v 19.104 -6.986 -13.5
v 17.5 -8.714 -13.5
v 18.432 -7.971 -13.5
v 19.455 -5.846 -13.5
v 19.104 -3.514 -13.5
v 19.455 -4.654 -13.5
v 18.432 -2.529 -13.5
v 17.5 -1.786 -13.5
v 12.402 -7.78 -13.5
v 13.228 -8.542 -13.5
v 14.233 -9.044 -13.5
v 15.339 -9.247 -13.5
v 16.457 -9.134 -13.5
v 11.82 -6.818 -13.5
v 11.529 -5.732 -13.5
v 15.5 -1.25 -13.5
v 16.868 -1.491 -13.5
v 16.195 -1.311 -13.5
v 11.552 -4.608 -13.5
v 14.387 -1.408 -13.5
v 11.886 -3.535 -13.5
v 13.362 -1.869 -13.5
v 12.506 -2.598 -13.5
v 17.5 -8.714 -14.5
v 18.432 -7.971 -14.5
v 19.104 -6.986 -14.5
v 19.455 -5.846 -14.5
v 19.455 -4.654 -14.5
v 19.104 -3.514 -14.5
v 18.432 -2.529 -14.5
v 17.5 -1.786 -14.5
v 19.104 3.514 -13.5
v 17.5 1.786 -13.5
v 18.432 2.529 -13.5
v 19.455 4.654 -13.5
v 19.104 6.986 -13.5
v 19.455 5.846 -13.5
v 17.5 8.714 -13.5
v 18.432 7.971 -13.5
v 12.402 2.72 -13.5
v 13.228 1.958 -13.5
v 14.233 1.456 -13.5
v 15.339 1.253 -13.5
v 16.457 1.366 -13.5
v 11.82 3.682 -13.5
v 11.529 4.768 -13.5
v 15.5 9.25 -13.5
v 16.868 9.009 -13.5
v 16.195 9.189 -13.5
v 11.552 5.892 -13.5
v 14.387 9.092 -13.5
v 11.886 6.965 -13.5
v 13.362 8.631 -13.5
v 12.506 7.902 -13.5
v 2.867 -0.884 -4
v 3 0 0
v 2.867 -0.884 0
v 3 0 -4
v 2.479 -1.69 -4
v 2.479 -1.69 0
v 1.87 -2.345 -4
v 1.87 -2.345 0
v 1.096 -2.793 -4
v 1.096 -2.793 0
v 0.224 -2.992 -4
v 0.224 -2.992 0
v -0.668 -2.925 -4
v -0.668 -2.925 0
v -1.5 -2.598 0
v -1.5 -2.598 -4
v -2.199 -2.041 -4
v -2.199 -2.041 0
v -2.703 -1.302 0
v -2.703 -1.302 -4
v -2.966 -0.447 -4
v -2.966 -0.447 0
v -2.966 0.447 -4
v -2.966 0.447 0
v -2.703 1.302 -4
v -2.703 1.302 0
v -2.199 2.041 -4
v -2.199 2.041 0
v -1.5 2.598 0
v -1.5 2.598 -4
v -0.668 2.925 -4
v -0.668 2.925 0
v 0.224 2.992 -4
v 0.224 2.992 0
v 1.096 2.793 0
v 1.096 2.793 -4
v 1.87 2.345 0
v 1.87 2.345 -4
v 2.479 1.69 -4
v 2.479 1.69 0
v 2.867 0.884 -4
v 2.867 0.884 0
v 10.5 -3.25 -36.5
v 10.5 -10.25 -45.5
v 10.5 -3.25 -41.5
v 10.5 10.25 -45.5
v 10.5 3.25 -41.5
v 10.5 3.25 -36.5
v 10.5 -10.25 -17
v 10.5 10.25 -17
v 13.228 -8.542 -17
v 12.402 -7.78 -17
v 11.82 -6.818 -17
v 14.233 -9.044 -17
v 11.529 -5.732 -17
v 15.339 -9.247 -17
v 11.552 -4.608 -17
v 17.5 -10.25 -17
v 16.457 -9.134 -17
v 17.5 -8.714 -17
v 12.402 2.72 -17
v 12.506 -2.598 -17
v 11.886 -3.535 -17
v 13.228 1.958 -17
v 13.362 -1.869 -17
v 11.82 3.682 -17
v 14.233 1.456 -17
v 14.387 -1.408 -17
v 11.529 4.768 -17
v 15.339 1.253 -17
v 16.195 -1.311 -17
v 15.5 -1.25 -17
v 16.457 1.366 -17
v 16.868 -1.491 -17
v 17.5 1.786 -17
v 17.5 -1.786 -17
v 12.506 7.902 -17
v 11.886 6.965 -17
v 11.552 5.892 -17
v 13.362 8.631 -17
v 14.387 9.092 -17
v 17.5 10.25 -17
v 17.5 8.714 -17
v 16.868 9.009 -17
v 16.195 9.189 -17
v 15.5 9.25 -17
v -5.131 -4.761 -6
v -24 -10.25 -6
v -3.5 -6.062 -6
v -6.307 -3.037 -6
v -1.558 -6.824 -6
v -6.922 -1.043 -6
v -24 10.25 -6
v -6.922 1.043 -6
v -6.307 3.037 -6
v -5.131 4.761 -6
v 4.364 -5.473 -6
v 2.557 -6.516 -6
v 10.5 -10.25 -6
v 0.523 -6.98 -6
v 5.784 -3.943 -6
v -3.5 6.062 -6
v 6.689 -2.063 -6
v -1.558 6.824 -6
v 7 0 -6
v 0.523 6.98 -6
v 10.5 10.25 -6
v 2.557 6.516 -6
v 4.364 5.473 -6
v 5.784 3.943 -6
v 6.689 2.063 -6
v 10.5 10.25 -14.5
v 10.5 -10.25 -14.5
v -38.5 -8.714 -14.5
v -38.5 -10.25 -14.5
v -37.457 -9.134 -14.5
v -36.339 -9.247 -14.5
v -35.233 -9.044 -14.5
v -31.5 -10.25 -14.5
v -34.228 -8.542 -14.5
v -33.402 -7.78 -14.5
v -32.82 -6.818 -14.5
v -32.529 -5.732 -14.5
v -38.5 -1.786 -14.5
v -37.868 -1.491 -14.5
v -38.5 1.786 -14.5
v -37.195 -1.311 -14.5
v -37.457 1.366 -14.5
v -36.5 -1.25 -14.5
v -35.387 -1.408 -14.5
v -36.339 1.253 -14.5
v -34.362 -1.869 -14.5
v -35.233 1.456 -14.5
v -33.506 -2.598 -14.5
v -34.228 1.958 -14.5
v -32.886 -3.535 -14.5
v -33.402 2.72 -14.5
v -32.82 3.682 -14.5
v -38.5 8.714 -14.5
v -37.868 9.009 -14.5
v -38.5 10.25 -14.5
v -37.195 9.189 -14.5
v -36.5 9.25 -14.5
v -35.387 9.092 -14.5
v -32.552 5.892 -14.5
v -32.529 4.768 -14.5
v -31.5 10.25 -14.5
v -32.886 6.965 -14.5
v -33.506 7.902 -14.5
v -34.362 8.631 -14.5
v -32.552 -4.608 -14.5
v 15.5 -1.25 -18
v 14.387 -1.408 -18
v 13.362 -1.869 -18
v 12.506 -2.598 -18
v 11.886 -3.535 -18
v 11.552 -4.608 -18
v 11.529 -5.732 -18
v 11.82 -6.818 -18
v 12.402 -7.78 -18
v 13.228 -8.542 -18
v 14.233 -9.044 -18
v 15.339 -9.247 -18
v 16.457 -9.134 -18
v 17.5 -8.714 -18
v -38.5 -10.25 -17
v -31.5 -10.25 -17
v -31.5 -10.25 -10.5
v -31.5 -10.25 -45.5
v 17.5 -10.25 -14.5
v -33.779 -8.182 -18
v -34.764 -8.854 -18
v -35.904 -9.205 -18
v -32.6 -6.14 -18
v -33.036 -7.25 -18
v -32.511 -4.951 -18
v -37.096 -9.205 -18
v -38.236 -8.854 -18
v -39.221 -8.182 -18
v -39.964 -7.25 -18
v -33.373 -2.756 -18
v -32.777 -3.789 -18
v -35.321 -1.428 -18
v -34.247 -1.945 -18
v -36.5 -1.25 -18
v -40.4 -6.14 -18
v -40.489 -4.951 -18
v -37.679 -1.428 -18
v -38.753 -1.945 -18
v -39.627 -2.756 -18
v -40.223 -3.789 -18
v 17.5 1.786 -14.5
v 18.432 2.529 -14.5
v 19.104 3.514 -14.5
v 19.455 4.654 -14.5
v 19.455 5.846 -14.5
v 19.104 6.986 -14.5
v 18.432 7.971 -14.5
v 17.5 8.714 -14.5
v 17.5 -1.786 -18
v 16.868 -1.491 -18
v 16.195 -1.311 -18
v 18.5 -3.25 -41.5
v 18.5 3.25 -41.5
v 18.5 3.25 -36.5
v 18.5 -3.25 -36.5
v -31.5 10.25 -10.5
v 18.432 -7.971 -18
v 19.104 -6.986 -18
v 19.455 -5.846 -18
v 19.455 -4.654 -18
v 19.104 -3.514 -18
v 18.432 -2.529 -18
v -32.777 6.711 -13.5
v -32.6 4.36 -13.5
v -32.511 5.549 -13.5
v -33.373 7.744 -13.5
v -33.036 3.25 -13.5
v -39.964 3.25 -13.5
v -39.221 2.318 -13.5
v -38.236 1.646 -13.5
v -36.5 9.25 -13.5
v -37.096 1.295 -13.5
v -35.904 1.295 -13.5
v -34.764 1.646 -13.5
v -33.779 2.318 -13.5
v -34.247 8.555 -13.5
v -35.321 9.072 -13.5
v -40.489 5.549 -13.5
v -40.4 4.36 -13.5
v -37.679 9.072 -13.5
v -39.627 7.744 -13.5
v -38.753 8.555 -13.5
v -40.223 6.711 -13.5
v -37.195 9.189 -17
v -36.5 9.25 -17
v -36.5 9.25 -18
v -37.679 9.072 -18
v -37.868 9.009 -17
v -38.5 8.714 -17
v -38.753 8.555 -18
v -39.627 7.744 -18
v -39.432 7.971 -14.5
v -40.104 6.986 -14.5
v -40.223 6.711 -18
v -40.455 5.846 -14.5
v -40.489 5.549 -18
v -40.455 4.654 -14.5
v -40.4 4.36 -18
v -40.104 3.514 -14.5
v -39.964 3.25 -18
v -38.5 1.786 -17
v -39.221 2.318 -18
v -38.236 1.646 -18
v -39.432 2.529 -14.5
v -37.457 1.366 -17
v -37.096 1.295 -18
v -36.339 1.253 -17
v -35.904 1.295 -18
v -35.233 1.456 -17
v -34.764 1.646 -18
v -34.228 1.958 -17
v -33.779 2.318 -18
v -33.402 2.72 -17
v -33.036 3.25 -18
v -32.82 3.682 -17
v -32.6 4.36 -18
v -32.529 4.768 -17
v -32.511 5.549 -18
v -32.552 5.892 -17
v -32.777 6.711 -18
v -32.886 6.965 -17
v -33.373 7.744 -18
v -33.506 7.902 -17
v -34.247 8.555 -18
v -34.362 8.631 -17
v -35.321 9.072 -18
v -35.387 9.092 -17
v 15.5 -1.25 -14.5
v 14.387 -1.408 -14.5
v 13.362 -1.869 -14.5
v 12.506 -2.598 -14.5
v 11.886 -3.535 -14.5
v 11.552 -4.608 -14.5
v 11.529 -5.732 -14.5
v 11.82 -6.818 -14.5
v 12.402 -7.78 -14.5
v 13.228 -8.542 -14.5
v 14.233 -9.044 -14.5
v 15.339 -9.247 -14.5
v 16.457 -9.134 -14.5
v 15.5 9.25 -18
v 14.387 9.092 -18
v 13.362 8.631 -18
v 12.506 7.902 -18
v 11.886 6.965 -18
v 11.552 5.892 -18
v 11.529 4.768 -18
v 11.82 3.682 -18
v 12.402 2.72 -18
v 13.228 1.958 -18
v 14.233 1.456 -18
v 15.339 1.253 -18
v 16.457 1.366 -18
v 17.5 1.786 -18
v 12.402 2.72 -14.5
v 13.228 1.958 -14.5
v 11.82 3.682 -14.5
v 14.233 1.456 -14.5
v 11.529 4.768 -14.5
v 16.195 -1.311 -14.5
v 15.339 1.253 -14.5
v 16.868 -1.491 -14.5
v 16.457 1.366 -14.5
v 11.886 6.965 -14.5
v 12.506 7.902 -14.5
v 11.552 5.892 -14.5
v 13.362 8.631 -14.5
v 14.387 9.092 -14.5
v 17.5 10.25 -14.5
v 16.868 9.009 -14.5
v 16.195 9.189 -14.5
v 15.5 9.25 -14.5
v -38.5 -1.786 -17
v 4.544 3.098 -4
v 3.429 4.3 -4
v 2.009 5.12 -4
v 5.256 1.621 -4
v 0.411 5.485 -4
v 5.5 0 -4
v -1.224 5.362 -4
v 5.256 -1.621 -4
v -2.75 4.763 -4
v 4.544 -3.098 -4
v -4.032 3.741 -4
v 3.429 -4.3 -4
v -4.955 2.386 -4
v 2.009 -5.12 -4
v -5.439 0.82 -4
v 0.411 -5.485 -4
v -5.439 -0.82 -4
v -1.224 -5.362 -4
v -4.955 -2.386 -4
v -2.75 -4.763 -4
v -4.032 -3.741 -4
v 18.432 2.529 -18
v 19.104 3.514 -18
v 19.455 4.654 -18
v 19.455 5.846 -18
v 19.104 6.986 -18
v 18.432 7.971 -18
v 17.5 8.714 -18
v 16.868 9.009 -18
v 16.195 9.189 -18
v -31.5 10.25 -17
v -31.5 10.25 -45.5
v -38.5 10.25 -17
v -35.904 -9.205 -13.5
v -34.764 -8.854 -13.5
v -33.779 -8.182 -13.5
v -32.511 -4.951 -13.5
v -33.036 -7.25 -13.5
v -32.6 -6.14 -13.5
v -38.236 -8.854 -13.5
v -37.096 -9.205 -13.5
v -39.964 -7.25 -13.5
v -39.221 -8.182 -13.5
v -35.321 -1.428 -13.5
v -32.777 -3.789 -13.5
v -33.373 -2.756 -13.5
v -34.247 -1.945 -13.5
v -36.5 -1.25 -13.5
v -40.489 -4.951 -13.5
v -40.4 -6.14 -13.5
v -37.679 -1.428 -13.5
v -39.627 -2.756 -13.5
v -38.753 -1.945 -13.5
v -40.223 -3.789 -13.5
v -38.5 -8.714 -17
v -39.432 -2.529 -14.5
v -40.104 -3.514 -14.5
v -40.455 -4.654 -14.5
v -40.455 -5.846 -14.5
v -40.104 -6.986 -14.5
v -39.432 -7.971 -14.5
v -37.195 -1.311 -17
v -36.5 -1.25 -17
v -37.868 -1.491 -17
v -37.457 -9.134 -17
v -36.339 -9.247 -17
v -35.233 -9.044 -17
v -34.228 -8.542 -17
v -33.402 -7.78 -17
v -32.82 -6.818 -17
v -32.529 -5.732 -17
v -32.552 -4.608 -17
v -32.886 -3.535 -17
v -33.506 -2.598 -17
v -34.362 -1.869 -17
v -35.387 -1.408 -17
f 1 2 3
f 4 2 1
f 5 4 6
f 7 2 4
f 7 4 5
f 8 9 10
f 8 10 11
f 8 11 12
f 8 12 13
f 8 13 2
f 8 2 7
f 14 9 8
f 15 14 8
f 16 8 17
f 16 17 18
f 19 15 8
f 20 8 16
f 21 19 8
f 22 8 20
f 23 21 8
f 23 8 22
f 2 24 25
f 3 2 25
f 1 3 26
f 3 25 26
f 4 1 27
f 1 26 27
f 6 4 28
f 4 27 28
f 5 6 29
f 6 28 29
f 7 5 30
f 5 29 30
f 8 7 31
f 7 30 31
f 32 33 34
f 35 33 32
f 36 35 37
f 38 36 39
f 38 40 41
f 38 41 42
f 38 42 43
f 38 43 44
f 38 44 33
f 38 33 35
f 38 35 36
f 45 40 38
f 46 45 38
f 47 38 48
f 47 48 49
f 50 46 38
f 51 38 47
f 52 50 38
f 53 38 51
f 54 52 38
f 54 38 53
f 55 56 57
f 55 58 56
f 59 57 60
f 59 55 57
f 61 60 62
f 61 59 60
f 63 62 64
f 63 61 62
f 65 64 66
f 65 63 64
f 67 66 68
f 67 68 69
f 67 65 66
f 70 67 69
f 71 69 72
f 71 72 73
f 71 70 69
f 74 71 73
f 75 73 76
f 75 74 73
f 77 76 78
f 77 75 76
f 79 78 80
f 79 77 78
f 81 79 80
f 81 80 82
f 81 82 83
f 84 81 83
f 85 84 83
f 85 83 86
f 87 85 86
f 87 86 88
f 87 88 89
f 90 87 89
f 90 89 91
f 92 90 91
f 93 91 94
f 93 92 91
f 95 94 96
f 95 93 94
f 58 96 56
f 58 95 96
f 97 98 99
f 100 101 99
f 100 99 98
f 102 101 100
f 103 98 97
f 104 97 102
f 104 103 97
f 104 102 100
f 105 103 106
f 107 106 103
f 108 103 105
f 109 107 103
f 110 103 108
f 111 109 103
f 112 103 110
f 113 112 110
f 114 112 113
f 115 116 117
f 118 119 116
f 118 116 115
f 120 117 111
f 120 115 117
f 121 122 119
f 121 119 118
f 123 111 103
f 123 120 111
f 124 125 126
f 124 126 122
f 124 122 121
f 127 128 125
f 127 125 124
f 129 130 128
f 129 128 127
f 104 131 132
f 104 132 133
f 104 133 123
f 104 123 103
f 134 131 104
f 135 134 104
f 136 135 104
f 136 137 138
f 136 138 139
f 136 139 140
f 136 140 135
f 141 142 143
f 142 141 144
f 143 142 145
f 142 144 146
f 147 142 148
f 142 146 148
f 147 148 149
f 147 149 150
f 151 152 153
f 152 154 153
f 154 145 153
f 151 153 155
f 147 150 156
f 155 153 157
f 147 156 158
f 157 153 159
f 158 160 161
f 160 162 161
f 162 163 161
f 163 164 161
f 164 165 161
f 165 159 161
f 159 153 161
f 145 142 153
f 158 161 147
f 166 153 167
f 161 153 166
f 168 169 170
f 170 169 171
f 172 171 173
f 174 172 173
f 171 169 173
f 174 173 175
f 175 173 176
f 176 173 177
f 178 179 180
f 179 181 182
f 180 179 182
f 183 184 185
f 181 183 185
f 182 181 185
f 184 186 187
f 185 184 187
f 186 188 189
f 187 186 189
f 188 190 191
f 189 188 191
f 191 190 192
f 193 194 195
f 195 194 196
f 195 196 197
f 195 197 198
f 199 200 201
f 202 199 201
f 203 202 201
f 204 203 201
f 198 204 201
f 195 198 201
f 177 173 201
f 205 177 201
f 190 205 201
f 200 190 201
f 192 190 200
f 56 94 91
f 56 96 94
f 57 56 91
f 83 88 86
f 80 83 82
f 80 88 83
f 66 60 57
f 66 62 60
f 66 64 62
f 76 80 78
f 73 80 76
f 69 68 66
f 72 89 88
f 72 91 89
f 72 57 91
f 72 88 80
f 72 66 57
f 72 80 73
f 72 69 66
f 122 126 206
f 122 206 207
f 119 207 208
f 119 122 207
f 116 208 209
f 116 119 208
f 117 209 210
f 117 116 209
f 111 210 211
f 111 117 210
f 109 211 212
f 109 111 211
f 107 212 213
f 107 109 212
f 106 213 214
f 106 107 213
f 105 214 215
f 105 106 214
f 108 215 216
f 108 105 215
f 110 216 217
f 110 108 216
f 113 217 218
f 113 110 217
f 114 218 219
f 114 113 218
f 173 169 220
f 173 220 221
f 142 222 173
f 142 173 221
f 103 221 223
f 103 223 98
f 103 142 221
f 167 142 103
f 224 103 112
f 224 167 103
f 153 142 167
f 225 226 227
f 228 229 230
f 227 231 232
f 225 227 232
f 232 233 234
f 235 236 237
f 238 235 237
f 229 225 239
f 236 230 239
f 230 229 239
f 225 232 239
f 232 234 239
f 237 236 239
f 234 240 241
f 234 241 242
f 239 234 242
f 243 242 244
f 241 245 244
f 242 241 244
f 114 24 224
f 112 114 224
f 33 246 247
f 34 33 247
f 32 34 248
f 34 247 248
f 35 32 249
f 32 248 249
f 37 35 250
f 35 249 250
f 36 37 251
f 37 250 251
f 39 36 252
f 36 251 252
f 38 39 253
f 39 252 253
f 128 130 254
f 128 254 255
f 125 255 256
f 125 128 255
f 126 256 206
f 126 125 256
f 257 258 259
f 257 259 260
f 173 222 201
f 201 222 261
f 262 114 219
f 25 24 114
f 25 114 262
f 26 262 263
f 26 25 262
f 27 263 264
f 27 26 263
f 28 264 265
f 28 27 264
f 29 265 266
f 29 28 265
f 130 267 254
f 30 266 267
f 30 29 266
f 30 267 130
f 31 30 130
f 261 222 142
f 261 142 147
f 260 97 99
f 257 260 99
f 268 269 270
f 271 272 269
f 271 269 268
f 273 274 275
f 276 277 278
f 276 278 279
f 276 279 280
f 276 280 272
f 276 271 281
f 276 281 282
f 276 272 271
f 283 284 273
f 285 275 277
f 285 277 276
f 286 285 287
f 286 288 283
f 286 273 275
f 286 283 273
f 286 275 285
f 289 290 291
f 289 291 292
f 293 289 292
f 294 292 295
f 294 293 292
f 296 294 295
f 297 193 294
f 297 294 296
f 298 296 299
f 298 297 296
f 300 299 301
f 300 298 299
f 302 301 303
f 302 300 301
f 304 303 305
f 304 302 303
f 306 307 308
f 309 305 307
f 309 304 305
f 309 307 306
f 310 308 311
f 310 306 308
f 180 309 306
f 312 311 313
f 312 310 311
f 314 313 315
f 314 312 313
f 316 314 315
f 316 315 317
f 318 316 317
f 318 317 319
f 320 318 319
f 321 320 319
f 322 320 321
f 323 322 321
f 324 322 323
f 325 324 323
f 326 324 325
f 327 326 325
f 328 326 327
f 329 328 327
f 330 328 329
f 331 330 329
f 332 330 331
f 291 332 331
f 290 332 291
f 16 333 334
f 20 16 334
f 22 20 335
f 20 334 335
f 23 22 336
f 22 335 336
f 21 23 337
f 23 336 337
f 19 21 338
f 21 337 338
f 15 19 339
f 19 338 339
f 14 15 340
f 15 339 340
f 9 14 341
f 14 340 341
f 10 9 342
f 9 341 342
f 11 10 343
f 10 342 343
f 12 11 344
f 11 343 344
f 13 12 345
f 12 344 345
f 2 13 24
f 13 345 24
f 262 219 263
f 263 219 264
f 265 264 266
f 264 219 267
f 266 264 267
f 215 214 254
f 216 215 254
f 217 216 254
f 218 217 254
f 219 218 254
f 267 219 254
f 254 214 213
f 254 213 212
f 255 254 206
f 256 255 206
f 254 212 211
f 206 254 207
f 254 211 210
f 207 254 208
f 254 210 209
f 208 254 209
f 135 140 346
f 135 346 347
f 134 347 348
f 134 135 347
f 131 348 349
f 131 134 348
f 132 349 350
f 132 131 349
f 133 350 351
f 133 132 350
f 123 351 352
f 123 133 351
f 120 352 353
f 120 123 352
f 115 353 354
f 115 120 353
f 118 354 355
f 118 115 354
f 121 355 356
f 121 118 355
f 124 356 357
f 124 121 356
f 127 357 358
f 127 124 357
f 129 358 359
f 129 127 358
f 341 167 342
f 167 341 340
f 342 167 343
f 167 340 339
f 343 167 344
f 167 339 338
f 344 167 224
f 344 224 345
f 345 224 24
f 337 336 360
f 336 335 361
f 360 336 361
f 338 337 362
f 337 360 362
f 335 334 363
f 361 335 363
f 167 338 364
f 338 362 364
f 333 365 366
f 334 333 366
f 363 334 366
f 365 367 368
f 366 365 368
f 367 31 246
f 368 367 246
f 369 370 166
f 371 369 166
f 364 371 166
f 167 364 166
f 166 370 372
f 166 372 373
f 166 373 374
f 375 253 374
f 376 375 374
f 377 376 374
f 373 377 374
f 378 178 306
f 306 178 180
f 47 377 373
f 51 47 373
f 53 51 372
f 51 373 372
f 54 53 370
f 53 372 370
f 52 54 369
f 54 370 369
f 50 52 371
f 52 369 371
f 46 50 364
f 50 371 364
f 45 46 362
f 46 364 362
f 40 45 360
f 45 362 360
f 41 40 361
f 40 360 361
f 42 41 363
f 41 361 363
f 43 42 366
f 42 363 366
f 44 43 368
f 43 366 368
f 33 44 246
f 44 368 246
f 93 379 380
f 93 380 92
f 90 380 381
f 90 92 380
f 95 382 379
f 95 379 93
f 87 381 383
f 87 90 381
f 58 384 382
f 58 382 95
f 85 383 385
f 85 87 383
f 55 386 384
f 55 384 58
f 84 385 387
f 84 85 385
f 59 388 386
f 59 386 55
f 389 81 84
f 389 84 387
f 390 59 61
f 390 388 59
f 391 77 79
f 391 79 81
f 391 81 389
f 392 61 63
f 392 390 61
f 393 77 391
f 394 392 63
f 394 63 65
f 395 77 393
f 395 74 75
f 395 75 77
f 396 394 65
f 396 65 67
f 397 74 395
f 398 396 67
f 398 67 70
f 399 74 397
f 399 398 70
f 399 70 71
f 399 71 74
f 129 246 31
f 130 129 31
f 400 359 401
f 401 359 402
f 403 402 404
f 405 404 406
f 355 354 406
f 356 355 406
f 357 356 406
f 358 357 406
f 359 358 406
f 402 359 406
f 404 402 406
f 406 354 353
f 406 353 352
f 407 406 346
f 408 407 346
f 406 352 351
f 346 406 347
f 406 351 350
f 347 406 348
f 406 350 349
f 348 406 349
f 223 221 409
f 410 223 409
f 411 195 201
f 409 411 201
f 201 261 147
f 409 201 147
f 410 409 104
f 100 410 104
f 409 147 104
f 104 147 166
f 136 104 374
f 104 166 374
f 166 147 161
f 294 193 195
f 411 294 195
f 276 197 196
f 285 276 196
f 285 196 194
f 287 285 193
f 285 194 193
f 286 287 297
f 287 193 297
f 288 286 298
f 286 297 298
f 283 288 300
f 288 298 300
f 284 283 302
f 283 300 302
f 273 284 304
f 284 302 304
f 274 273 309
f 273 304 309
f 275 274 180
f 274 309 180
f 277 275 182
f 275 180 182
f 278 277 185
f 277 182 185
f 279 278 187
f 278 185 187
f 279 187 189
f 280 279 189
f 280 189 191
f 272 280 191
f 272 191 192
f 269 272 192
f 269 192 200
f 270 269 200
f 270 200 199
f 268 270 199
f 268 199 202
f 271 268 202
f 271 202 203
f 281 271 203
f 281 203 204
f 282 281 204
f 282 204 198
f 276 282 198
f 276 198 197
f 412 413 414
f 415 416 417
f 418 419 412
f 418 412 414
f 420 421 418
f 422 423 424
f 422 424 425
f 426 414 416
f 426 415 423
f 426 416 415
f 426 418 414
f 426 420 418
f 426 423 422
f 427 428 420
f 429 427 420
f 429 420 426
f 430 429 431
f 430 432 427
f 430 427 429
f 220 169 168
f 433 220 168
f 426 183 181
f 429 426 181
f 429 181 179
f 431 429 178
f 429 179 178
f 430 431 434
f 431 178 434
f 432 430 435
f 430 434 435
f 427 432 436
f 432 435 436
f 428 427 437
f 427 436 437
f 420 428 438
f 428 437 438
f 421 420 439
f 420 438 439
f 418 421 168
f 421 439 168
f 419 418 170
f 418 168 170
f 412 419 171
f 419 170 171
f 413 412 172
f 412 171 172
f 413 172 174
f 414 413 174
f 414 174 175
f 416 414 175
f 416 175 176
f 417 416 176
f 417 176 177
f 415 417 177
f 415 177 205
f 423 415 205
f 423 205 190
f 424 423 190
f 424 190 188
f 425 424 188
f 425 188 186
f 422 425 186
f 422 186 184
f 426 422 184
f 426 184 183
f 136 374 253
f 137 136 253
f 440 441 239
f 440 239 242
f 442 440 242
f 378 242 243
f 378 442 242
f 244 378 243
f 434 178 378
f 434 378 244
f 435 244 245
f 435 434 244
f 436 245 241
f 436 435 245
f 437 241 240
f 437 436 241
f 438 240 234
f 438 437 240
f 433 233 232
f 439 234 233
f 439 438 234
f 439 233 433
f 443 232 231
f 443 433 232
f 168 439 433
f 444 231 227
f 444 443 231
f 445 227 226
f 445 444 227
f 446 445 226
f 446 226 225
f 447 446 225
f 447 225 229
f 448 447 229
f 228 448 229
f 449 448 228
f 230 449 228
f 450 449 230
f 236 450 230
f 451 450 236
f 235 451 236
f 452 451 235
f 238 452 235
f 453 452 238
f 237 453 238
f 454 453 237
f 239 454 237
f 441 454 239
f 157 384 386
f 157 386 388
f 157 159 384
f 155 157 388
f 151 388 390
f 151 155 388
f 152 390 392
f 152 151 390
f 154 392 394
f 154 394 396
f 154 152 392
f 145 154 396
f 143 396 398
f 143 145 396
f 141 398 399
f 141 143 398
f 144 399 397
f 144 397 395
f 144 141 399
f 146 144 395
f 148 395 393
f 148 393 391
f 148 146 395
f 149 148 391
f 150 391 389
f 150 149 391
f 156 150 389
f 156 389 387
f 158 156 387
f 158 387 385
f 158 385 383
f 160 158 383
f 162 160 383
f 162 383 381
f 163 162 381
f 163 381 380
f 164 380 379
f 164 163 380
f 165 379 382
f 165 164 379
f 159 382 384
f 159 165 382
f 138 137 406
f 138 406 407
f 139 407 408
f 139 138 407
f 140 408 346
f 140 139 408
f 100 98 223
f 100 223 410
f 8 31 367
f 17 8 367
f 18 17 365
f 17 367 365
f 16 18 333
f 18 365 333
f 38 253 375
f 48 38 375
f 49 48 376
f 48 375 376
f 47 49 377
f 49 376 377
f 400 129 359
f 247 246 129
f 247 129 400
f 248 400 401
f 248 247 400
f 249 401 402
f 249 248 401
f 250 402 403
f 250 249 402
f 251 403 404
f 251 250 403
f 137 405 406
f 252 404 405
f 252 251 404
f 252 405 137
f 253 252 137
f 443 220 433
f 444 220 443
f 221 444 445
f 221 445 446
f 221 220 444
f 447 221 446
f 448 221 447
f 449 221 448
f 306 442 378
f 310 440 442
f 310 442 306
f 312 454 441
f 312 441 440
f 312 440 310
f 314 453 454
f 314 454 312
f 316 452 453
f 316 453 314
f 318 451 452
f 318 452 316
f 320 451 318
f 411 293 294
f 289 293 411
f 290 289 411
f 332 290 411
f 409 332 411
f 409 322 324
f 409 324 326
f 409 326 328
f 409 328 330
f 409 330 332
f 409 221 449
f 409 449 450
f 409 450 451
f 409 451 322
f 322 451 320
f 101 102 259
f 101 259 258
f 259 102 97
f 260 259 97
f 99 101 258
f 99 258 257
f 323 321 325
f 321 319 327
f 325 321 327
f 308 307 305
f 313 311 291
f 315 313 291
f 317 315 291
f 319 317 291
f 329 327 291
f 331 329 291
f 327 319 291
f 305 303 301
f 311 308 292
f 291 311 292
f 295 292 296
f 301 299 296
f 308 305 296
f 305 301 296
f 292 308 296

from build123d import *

# Parameters (mm, degrees)
F0_W          = 20.5
F0_H          = 42
F1_DEPTH      = 39.5
F2_START      = 8.5
F2_DEPTH      = 2.5
F5_W          = 6.5
F5_H          = 5
F6_DEPTH      = 8
F7_SIZE2      = 4.5
F7_SIZE       = 7.5
F8_R          = 4
F9_DEPTH      = 1
F9_DEPTH_BACK = 3.5
F10_ANGLE     = 180
F12_ANGLE     = -90


# Not quite as in the source:
# - a feature names something its author has since deleted; it is built from what else it names


with BuildPart() as f1:
    # F0 (on Top) → F1 (new body)
    with BuildSketch(Plane.XY):
        with Locations((0, -10.5)):
            Rectangle(F0_W, F0_H)
    extrude(amount=F1_DEPTH)

    # F0 (on Top) → F2 (join)
    with BuildSketch(Plane.XY.offset(F2_START)):
        with BuildLine():
            Line((-10.25, 10.5), (10.25, 10.5))
            Line((10.25, 10.5), (10.25, 17.5))
            Line((10.25, 17.5), (6.2807764064, 17.5))
            ThreePointArc((6.2807764064, 17.5), (5.25, 13.25), (4.2192235936, 17.5))
            Line((4.2192235936, 17.5), (-4.2192235936, 17.5))
            ThreePointArc((-4.2192235936, 17.5), (-5.25, 13.25), (-6.2807764064, 17.5))
            Line((-6.2807764064, 17.5), (-10.25, 17.5))
            Line((-10.25, 17.5), (-10.25, 10.5))
        make_face()
        with BuildLine():
            Line((10.25, -38.5), (10.25, -31.5))
            Line((10.25, -31.5), (-10.25, -31.5))
            Line((-10.25, -31.5), (-10.25, -38.5))
            Line((-10.25, -38.5), (-6.2807764064, -38.5))
            ThreePointArc((-6.2807764064, -38.5), (-5.25, -34.25), (-4.2192235936, -38.5))
            Line((-4.2192235936, -38.5), (4.2192235936, -38.5))
            ThreePointArc((4.2192235936, -38.5), (5.25, -34.25), (6.2807764064, -38.5))
            Line((6.2807764064, -38.5), (10.25, -38.5))
        make_face()
    extrude(amount=F2_DEPTH)

    # F3 (on Right) → F4 (revolve)
    with BuildSketch(Plane.YZ):
        Polygon((5.5, -2), (7, 0), (0, 0), (0, -6), (3, -6), (3, -2), align=None)
    revolve(axis=Axis((0, 0, -3), (0, 0, 1)))

    # F5 (on face) → F6 (join)
    with BuildSketch(Plane(origin=(0, 10.5, 0), x_dir=(-1, 0, 0), z_dir=(0, 1, 0))):
        with Locations((0, 33)):
            Rectangle(F5_W, F5_H)
    extrude(amount=F6_DEPTH)

    # F7
    f7_edges = [f1.edges().sort_by_distance(p)[0] for p in [
        (0, -31.5, 0),
    ]]
    f7_side = f1.faces().sort_by_distance((0, -12.786008, 0))[0]
    chamfer(f7_edges, length=F7_SIZE, length2=F7_SIZE2, reference=f7_side)

    # F8 (on face) → F9 (join, two sides)
    with BuildSketch(Plane(origin=(0, 0, 8.5), x_dir=(1, 0, 0), z_dir=(0, 0, -1))) as f9_sk:
        with Locations((-5.25, 36.5)):
            Circle(F8_R)
        with Locations((5.25, 36.5)):
            Circle(F8_R)
        with BuildLine():
            Line((4.2192235936, -17.5), (1.7858983849, -17.5))
            ThreePointArc((1.7858983849, -17.5), (5.25, -19.5), (8.7141016151, -17.5))
            Line((8.7141016151, -17.5), (6.2807764064, -17.5))
            ThreePointArc((6.2807764064, -17.5), (5.25, -13.25), (4.2192235936, -17.5))
        make_face()
        with BuildLine():
            Line((-8.7141016151, -17.5), (-6.2807764064, -17.5))
            ThreePointArc((-6.2807764064, -17.5), (-5.25, -13.25), (-4.2192235936, -17.5))
            Line((-4.2192235936, -17.5), (-1.7858983849, -17.5))
            ThreePointArc((-1.7858983849, -17.5), (-1.3862966948, -16.5352761804), (-1.25, -15.5))
            ThreePointArc((-1.25, -15.5), (-6.2852761804, -11.6362966948), (-8.7141016151, -17.5))
        make_face()
        with BuildLine():
            ThreePointArc((-4.2192235936, -17.5), (-5.25, -13.25), (-6.2807764064, -17.5))
            Line((-6.2807764064, -17.5), (-8.7141016151, -17.5))
            ThreePointArc((-8.7141016151, -17.5), (-5.25, -19.5), (-1.7858983849, -17.5))
            Line((-1.7858983849, -17.5), (-4.2192235936, -17.5))
        make_face()
        with BuildLine():
            ThreePointArc((9.25, -15.5), (4.2147238196, -11.6362966948), (1.7858983849, -17.5))
            Line((1.7858983849, -17.5), (4.2192235936, -17.5))
            ThreePointArc((4.2192235936, -17.5), (5.25, -13.25), (6.2807764064, -17.5))
            Line((6.2807764064, -17.5), (8.7141016151, -17.5))
            ThreePointArc((8.7141016151, -17.5), (9.1137033052, -16.5352761804), (9.25, -15.5))
        make_face()
    extrude(amount=F9_DEPTH)
    extrude(f9_sk.sketch, amount=-F9_DEPTH_BACK)


with BuildPart() as f1_1:
    # F10: moved
    add(f1.part.rotate(Axis((0, 5.25, 0), (0, 1, 0)), F10_ANGLE))


with BuildPart() as f1_2:
    # F11: moved
    add(f1_1.part.moved(Location((0, 0, -6))))


with BuildPart() as f1_3:
    # F12: moved
    add(f1_2.part.rotate(Axis((0, 0, -3), (0, 0, 1)), F12_ANGLE))


solid = f1_3.part
